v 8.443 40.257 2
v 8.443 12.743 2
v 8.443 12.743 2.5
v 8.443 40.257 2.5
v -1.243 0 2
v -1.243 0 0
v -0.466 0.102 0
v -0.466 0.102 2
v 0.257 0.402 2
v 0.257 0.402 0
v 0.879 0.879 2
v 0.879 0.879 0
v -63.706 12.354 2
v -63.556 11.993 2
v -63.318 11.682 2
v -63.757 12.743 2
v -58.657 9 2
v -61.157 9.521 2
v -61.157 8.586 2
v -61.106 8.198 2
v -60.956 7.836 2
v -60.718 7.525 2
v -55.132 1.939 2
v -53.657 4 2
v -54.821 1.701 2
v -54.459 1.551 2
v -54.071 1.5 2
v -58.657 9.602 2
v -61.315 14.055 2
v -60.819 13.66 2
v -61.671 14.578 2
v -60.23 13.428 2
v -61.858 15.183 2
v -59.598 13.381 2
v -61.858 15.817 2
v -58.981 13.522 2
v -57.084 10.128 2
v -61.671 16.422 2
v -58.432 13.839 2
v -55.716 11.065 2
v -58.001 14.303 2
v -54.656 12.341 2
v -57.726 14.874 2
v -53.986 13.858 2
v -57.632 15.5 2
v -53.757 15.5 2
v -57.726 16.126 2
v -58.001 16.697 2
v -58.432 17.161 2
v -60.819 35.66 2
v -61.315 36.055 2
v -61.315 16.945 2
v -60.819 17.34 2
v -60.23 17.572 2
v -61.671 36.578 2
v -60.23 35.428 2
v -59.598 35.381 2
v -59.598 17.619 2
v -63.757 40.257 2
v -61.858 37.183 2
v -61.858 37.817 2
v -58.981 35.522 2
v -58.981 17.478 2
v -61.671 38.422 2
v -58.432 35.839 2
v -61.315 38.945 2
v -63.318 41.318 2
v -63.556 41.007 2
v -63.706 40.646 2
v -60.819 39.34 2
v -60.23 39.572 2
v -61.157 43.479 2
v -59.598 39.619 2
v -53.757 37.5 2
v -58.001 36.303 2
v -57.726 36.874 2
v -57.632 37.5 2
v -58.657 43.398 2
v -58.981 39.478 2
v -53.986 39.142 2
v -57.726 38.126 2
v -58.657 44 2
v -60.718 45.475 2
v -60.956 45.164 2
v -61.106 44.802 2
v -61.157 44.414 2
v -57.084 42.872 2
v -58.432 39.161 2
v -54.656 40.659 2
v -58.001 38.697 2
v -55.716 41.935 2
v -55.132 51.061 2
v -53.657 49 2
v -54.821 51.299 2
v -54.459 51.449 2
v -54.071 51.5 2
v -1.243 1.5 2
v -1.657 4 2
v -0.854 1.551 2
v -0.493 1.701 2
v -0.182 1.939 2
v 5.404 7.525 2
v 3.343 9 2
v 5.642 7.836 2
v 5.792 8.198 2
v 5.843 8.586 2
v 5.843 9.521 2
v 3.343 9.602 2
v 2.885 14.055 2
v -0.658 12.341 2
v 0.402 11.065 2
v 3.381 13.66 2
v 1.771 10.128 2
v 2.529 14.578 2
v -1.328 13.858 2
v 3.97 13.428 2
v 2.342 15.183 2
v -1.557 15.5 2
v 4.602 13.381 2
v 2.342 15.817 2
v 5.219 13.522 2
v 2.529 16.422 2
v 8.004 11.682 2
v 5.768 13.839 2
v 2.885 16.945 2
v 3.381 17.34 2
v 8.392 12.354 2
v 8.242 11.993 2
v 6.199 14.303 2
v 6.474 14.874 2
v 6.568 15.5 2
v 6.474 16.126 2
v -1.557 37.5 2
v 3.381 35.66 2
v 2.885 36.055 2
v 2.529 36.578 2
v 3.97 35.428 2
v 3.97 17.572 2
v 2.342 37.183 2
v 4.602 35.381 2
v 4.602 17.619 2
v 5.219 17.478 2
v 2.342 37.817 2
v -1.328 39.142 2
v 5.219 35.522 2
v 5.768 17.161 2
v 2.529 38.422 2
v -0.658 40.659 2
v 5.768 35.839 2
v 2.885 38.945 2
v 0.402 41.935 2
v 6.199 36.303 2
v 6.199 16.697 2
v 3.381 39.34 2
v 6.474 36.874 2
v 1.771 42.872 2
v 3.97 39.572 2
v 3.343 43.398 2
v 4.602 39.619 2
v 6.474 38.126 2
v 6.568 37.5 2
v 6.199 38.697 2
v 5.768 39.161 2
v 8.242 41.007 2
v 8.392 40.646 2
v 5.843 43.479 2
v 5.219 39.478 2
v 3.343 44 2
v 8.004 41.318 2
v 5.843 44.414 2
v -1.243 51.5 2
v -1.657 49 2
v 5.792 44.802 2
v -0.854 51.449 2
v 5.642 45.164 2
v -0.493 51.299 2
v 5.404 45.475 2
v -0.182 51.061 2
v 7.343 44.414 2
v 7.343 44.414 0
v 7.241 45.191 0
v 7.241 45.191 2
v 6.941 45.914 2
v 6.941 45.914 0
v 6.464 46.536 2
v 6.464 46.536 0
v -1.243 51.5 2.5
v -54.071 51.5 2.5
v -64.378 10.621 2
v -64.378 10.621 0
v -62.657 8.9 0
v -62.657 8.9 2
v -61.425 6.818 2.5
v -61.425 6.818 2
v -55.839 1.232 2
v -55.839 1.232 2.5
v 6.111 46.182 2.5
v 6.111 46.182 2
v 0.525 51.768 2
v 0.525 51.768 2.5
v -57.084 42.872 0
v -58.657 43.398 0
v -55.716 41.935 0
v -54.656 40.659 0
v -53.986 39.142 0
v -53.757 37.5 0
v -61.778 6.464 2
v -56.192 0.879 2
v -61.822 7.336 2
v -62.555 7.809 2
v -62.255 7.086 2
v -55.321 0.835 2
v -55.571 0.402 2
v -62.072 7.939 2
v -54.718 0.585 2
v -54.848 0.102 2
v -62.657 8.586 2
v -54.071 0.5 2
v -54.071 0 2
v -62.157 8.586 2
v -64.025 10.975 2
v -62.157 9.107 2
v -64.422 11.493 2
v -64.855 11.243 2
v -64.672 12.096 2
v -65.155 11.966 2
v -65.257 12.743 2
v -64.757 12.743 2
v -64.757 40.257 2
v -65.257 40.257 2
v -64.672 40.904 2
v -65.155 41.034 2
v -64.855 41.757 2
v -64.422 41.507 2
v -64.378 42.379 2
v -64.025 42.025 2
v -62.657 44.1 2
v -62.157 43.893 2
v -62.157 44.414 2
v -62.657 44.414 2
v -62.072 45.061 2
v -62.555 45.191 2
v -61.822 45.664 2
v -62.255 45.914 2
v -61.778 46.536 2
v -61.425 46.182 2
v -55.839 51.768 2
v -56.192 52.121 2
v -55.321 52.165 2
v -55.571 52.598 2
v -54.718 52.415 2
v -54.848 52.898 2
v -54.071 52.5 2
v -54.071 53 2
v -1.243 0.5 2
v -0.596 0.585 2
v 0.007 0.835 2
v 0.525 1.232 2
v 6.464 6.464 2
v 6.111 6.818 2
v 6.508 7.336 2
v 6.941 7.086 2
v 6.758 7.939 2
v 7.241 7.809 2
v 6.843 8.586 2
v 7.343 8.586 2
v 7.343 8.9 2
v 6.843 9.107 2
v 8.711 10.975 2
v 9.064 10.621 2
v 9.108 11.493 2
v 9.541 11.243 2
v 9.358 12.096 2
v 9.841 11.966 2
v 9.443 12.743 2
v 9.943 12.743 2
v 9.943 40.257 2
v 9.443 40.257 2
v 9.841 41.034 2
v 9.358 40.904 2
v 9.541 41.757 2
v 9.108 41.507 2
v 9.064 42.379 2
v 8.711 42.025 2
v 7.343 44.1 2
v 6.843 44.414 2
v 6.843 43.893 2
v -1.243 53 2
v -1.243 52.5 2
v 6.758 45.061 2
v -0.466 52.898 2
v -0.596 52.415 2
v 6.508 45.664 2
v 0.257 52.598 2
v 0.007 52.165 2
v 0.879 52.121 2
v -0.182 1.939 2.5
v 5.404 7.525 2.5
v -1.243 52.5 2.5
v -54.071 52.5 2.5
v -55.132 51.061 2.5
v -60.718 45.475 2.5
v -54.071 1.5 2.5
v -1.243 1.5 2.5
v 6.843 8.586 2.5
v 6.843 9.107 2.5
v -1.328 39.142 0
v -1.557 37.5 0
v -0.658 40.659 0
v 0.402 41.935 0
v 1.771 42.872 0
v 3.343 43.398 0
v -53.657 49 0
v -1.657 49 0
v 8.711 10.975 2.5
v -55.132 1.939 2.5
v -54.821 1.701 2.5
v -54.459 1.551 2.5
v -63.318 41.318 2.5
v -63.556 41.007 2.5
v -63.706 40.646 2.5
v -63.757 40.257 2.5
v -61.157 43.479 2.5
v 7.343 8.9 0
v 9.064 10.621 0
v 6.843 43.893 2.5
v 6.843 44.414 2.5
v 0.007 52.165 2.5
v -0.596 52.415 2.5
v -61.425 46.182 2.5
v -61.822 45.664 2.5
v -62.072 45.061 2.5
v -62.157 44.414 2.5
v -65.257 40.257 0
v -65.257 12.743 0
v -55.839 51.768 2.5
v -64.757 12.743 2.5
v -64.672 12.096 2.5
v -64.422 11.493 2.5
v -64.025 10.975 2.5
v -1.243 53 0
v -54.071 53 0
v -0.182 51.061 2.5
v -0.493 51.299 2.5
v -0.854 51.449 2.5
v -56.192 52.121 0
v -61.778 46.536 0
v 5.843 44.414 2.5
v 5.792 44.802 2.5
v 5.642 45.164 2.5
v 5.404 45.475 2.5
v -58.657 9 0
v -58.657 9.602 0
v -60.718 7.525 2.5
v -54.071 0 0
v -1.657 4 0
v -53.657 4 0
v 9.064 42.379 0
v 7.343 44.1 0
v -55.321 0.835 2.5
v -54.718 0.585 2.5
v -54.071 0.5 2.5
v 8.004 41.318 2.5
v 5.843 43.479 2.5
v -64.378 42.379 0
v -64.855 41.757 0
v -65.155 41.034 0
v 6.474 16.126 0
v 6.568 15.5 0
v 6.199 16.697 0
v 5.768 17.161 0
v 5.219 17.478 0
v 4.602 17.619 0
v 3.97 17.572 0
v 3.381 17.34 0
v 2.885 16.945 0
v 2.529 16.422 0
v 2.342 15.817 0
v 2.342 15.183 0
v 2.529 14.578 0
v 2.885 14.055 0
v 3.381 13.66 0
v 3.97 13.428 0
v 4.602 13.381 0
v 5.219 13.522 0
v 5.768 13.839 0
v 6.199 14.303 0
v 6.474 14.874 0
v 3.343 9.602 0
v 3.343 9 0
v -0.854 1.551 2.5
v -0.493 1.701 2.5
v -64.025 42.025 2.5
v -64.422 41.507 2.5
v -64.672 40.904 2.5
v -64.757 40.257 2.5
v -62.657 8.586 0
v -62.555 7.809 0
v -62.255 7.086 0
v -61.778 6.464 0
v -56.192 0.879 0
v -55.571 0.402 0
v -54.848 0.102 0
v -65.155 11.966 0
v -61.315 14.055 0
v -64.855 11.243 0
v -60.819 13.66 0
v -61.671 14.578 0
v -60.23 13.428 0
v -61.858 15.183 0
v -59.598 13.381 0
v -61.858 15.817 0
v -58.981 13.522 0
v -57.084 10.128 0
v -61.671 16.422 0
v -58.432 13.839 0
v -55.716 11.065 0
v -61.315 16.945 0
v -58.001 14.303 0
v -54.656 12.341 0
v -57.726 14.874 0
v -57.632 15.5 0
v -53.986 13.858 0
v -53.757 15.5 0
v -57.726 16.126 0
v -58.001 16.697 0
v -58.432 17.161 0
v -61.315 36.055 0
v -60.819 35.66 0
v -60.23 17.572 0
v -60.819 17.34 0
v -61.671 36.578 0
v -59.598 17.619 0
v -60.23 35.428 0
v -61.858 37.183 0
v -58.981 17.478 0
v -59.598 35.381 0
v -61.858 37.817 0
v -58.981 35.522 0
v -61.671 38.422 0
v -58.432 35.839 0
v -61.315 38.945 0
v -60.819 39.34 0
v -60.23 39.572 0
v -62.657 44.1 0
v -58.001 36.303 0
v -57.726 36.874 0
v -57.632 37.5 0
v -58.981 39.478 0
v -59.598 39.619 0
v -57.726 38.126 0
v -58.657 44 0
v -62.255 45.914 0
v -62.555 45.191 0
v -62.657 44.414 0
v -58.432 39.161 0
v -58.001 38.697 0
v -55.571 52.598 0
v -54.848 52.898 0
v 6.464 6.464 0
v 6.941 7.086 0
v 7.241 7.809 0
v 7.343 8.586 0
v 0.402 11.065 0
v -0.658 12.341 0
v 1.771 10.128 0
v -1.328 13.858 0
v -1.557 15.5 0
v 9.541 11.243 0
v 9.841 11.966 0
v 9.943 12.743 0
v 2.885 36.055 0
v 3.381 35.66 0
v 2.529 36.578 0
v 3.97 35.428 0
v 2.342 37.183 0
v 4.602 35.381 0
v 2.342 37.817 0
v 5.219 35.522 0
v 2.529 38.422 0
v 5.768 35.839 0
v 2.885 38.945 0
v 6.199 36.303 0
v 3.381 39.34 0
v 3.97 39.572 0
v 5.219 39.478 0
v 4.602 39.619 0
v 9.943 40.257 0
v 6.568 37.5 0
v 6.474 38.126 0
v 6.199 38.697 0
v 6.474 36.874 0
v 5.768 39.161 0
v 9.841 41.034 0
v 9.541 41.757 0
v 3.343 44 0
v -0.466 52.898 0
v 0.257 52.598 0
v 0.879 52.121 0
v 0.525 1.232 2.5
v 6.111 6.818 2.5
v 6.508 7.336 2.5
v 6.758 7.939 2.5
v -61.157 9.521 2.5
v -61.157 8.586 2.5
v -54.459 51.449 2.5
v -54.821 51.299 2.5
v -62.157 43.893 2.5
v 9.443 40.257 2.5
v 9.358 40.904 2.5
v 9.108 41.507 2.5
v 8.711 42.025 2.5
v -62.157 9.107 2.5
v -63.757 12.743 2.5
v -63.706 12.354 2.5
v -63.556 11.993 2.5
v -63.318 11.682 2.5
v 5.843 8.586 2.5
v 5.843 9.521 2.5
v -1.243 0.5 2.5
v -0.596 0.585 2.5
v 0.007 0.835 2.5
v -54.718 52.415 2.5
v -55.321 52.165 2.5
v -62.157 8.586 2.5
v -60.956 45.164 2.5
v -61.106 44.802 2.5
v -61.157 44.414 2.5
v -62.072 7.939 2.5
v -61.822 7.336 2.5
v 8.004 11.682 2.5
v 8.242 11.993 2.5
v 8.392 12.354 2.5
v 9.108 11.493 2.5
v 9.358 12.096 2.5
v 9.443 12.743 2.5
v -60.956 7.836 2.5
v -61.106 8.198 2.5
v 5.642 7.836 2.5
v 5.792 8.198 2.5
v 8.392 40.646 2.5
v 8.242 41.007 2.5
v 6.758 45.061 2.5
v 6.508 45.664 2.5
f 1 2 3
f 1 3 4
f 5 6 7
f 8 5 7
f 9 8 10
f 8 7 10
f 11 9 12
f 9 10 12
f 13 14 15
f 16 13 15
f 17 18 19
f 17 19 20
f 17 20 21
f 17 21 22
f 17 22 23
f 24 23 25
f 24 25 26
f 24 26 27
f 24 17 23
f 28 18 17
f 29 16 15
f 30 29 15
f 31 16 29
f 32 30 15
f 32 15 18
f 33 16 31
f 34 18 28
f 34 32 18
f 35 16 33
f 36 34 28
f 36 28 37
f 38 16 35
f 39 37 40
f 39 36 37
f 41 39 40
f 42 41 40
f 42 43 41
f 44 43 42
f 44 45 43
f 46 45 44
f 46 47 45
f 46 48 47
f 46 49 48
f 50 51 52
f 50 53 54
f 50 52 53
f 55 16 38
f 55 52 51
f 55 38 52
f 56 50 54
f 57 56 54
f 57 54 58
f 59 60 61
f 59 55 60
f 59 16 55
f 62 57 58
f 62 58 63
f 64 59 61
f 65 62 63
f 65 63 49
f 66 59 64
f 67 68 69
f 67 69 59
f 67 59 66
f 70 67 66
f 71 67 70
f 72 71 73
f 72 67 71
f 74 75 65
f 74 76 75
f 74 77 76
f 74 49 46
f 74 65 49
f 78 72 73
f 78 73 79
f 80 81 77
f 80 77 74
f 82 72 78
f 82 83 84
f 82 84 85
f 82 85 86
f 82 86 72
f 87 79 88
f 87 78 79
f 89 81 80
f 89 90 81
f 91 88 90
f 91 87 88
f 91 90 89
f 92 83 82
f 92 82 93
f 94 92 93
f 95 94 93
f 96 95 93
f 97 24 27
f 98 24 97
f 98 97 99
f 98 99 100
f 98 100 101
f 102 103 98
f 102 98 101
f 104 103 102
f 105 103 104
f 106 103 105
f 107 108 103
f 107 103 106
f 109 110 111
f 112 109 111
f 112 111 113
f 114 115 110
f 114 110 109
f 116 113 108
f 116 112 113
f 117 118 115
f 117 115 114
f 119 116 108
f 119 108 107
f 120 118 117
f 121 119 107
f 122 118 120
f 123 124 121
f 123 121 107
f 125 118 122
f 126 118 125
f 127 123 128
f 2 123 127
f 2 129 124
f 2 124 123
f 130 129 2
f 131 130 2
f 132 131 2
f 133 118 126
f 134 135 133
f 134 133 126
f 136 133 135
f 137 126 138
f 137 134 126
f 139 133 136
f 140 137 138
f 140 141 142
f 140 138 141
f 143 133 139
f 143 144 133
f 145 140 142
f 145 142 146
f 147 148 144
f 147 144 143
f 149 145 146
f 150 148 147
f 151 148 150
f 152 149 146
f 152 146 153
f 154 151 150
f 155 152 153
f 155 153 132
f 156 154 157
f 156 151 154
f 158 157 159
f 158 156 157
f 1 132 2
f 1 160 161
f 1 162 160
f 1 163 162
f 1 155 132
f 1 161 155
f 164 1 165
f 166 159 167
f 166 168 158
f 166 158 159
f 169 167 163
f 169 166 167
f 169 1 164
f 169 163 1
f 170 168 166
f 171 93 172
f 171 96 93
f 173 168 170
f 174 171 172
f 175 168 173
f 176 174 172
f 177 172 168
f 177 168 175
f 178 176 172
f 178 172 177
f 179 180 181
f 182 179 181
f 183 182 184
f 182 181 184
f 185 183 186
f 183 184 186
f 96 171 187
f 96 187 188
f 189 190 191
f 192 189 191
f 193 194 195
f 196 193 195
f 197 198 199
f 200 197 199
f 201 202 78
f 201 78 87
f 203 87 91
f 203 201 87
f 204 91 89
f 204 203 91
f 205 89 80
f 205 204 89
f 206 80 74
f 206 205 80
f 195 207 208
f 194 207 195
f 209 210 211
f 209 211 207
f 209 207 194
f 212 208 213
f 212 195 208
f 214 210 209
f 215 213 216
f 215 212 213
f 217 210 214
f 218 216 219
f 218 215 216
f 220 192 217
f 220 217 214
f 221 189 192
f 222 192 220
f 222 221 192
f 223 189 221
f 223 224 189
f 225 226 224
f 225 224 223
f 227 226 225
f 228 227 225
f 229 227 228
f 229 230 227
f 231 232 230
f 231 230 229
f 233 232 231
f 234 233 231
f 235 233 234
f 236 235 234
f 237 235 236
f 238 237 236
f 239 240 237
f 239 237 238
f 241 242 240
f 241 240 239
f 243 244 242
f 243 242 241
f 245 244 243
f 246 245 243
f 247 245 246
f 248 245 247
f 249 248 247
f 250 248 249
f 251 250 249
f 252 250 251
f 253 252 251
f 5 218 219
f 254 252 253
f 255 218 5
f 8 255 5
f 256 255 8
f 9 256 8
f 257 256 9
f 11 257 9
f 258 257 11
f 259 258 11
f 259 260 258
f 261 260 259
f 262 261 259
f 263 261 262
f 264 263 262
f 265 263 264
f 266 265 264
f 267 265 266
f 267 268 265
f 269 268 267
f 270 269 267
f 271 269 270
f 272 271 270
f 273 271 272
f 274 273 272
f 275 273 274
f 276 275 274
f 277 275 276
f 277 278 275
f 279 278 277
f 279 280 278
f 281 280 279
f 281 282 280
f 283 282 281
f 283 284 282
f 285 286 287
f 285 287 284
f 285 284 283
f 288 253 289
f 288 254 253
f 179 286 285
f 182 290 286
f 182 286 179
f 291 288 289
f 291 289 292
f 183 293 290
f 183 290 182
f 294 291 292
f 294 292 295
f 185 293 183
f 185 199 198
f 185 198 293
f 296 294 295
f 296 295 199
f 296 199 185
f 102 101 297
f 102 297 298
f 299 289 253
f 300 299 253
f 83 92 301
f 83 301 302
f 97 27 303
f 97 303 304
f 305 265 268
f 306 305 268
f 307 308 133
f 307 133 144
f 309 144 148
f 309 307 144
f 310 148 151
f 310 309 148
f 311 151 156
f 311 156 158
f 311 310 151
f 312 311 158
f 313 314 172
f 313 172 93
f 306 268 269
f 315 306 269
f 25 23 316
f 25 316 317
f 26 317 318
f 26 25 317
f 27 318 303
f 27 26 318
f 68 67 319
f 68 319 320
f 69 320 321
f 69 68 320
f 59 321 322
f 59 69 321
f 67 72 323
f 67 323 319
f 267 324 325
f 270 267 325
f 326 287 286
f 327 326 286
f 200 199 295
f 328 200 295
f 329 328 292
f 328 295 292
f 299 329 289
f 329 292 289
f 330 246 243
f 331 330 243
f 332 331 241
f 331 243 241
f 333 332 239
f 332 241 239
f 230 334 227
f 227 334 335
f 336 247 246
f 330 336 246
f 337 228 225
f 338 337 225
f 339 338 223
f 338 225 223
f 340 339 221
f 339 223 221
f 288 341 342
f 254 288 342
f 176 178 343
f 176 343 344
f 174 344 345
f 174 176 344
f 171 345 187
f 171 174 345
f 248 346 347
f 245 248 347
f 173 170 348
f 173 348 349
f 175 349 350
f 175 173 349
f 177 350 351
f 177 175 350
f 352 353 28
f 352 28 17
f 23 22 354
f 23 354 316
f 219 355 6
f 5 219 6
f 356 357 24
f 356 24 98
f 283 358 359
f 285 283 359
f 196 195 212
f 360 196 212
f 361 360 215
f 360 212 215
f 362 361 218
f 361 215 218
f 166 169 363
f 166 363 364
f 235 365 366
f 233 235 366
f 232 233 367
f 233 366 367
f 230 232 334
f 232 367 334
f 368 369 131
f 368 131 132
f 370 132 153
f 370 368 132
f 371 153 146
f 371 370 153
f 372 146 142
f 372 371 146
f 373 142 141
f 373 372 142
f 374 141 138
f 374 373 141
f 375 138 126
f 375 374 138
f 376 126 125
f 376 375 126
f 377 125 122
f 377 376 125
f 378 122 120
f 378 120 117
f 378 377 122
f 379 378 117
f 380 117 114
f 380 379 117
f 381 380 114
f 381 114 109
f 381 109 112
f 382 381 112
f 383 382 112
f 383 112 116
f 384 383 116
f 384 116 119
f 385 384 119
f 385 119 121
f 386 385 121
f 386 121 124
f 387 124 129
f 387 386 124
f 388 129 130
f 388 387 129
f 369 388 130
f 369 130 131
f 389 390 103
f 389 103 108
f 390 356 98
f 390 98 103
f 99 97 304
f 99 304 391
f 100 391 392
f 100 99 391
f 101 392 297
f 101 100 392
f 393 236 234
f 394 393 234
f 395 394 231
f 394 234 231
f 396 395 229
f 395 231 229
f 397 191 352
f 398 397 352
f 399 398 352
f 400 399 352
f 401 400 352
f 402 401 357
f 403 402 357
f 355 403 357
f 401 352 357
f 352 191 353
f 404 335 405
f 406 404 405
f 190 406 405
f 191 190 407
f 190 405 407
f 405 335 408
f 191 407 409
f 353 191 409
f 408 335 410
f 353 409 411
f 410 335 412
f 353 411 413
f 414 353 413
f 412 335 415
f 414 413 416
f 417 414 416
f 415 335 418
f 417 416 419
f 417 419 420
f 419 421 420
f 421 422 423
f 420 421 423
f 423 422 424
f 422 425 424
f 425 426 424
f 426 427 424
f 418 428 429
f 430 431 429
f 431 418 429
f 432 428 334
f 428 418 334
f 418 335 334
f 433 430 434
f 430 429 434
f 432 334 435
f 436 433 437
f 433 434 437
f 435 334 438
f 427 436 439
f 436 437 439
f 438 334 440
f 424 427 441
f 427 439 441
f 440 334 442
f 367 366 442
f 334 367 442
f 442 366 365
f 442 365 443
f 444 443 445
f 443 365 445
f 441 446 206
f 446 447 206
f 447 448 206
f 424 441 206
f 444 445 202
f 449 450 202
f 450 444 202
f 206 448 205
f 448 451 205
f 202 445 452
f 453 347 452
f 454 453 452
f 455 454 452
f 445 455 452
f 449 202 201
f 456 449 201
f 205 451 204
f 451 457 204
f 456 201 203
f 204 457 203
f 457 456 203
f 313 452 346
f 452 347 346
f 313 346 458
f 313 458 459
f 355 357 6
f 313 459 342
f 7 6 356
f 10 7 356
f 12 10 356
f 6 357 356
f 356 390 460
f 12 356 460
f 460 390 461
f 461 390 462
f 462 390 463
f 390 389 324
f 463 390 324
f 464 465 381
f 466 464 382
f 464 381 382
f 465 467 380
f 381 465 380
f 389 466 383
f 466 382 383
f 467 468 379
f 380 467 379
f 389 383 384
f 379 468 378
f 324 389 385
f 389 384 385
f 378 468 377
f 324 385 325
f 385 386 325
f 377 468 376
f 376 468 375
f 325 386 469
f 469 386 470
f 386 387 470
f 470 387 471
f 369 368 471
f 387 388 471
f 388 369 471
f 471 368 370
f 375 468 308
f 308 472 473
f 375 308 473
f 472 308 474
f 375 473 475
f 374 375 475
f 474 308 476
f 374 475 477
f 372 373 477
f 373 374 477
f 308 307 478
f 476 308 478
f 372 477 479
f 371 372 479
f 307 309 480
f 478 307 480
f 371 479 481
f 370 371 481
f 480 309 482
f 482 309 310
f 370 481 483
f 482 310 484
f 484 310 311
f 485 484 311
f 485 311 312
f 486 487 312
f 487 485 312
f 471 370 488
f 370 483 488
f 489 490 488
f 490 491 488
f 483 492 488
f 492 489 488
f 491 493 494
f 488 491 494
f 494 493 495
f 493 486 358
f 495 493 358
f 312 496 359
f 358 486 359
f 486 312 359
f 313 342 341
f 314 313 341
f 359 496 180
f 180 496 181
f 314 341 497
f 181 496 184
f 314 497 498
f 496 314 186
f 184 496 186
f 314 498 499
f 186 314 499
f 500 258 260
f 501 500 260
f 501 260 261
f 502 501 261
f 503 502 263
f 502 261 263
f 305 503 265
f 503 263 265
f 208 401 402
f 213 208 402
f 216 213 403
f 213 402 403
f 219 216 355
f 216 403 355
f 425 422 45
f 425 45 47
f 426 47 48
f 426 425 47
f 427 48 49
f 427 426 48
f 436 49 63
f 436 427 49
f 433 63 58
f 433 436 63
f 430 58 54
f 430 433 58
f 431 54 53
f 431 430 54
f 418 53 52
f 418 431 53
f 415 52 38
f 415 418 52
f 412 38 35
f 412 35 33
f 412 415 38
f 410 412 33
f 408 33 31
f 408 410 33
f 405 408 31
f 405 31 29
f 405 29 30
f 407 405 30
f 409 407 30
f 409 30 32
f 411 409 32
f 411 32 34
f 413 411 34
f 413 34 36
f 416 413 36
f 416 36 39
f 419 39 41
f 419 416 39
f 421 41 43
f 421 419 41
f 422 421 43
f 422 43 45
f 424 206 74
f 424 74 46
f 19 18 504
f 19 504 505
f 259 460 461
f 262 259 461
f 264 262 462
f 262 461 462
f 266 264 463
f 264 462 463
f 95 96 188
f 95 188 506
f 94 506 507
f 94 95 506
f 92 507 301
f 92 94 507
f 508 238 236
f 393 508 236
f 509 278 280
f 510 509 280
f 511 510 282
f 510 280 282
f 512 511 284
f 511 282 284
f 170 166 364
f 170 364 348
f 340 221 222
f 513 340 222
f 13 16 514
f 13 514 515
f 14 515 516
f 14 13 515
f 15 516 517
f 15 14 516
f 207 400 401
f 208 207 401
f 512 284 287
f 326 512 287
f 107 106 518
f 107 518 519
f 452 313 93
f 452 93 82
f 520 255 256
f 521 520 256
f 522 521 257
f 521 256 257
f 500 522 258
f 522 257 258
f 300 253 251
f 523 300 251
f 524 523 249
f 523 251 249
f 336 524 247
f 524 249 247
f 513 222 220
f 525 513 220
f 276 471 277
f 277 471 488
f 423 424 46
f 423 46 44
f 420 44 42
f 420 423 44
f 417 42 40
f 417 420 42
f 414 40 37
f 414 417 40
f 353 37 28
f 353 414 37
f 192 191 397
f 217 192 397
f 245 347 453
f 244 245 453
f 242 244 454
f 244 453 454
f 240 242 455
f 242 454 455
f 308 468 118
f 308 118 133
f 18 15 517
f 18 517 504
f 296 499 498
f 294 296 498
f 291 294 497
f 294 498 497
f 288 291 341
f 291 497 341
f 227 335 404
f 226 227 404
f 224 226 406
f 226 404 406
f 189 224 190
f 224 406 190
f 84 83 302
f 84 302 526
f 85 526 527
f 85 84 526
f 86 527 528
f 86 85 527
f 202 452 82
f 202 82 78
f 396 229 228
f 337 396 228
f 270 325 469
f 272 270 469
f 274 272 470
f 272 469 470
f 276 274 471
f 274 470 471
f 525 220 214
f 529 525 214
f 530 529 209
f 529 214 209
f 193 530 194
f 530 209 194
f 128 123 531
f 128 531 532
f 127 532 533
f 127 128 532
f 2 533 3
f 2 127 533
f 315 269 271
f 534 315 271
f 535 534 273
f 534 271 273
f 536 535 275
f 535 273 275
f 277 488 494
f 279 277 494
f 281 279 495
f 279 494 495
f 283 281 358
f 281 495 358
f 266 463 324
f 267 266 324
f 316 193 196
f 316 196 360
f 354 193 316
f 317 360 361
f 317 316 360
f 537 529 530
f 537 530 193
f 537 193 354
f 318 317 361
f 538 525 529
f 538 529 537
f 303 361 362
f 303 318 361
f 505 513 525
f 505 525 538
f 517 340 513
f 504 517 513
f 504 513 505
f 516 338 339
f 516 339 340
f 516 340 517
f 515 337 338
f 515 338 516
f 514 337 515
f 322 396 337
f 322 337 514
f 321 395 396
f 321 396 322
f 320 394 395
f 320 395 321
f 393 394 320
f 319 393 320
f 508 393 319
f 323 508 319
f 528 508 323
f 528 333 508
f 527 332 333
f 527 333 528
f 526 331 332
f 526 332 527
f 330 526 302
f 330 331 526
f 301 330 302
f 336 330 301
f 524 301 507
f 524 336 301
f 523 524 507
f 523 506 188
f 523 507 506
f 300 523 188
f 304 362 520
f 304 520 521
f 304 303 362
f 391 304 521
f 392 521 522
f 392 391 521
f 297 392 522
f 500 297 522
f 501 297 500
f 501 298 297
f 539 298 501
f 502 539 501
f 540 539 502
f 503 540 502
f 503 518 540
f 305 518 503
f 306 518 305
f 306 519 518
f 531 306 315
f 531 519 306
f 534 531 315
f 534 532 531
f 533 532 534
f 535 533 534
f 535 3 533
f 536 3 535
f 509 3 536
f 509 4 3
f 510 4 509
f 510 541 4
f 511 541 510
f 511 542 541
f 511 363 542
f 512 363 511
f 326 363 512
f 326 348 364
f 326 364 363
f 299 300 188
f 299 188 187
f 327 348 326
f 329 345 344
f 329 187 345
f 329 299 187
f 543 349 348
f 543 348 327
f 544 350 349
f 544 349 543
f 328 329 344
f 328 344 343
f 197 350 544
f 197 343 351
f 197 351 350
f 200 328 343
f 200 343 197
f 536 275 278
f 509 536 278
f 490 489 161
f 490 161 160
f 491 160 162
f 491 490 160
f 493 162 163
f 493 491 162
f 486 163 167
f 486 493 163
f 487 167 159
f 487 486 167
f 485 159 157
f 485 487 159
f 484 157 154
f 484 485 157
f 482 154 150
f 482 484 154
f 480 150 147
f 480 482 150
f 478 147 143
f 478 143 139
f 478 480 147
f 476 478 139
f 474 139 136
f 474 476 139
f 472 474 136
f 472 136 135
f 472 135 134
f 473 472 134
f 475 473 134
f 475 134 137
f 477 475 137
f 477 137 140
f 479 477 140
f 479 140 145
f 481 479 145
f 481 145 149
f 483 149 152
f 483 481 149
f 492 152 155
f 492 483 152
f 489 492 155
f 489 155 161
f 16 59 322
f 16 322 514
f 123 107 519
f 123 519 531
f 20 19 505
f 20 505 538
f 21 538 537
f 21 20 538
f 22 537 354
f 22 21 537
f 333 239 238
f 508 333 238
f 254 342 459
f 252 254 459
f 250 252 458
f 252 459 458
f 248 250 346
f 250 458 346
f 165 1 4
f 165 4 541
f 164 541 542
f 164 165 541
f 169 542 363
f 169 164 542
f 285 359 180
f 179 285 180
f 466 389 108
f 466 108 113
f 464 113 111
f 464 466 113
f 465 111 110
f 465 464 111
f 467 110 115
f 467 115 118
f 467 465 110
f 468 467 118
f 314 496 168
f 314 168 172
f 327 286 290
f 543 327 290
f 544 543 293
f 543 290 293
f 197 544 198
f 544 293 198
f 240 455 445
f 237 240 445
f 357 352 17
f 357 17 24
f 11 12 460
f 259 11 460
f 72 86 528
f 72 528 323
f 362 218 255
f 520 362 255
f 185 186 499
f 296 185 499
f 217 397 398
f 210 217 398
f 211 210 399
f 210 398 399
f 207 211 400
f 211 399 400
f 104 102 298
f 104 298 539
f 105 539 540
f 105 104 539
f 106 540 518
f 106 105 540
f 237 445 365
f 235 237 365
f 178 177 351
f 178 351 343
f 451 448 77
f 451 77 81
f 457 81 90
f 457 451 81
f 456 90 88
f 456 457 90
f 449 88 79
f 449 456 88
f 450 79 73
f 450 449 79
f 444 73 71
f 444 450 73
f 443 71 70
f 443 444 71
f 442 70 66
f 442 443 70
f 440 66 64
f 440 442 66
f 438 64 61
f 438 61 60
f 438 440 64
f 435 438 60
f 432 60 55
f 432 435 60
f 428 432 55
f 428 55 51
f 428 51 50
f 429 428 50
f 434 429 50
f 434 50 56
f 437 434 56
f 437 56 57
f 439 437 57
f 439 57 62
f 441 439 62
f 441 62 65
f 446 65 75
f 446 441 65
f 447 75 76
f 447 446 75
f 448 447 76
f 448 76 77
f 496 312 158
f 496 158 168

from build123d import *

# Parameters (mm, degrees)
SKETCH1_R           = 2.125
BOSS_EXTRUDE1_DEPTH = 2
BOSS_EXTRUDE2_DEPTH = 0.5


with BuildPart() as part:
    # Sketch1 → Boss-Extrude1 (new body)
    with BuildSketch(Plane.XY):
        with BuildLine():
            Line((-64.378174593, 10.621320344), (-62.656854249, 8.9))
            Line((-62.656854249, 8.9), (-62.656854249, 8.585786438))
            ThreePointArc((-62.656854249, 8.585786438), (-62.428492847, 7.437736141), (-61.778174593, 6.464466094))
            Line((-61.778174593, 6.464466094), (-56.192388155, 0.878679656))
            ThreePointArc((-56.192388155, 0.878679656), (-55.219118109, 0.228361402), (-54.071067812, 0))
            Line((-54.071067812, 0), (-1.242640687, 0))
            ThreePointArc((-1.242640687, 0), (-0.09459039, 0.228361402), (0.878679656, 0.878679656))
            Line((0.878679656, 0.878679656), (6.464466094, 6.464466094))
            ThreePointArc((6.464466094, 6.464466094), (7.114784348, 7.437736141), (7.343145751, 8.585786438))
            Line((7.343145751, 8.585786438), (7.343145751, 8.9))
            Line((7.343145751, 8.9), (9.064466094, 10.621320344))
            ThreePointArc((9.064466094, 10.621320344), (9.714784348, 11.59459039), (9.943145751, 12.742640687))
            Line((9.943145751, 12.742640687), (9.943145751, 40.257359313))
            ThreePointArc((9.943145751, 40.257359313), (9.714784348, 41.40540961), (9.064466094, 42.378679656))
            Line((9.064466094, 42.378679656), (7.343145751, 44.1))
            Line((7.343145751, 44.1), (7.343145751, 44.414213562))
            ThreePointArc((7.343145751, 44.414213562), (7.114784348, 45.562263859), (6.464466094, 46.535533906))
            Line((6.464466094, 46.535533906), (0.878679656, 52.121320344))
            ThreePointArc((0.878679656, 52.121320344), (-0.09459039, 52.771638598), (-1.242640687, 53))
            Line((-1.242640687, 53), (-54.071067812, 53))
            ThreePointArc((-54.071067812, 53), (-55.219118109, 52.771638598), (-56.192388155, 52.121320344))
            Line((-56.192388155, 52.121320344), (-61.778174593, 46.535533906))
            ThreePointArc((-61.778174593, 46.535533906), (-62.428492847, 45.562263859), (-62.656854249, 44.414213562))
            Line((-62.656854249, 44.414213562), (-62.656854249, 44.1))
            Line((-62.656854249, 44.1), (-64.378174593, 42.378679656))
            ThreePointArc((-64.378174593, 42.378679656), (-65.028492847, 41.40540961), (-65.256854249, 40.257359313))
            Line((-65.256854249, 40.257359313), (-65.256854249, 12.742640687))
            ThreePointArc((-65.256854249, 12.742640687), (-65.028492847, 11.59459039), (-64.378174593, 10.621320344))
        make_face()
        with Locations((4.443145751, 37.5)):
            Circle(SKETCH1_R, mode=Mode.SUBTRACT)
        with Locations((-59.756854249, 37.5)):
            Circle(SKETCH1_R, mode=Mode.SUBTRACT)
        with Locations((-59.756854249, 15.5)):
            Circle(SKETCH1_R, mode=Mode.SUBTRACT)
        with Locations((4.443145751, 15.5)):
            Circle(SKETCH1_R, mode=Mode.SUBTRACT)
        with BuildLine():
            Line((-1.656854249, 49), (-53.656854249, 49))
            Line((-53.656854249, 49), (-58.656854249, 44))
            Line((-58.656854249, 44), (-58.656854249, 43.398304841))
            ThreePointArc((-58.656854249, 43.398304841), (-55.141661946, 41.334057903), (-53.756854249, 37.5))
            Line((-53.756854249, 37.5), (-53.756854249, 15.5))
            ThreePointArc((-53.756854249, 15.5), (-55.141661946, 11.665942097), (-58.656854249, 9.601695159))
            Line((-58.656854249, 9.601695159), (-58.656854249, 9))
            Line((-58.656854249, 9), (-53.656854249, 4))
            Line((-53.656854249, 4), (-1.656854249, 4))
            Line((-1.656854249, 4), (3.343145751, 9))
            Line((3.343145751, 9), (3.343145751, 9.601695159))
            ThreePointArc((3.343145751, 9.601695159), (-0.172046553, 11.665942097), (-1.556854249, 15.5))
            Line((-1.556854249, 15.5), (-1.556854249, 37.5))
            ThreePointArc((-1.556854249, 37.5), (-0.172046553, 41.334057903), (3.343145751, 43.398304841))
            Line((3.343145751, 43.398304841), (3.343145751, 44))
            Line((3.343145751, 44), (-1.656854249, 49))
        make_face(mode=Mode.SUBTRACT)
    extrude(amount=BOSS_EXTRUDE1_DEPTH)

    # Sketch2 → Boss-Extrude2 (add)
    with BuildSketch(Plane.XY.offset(2)):
        with BuildLine():
            Line((-62.156854249, 9.107106781), (-62.156854249, 8.585786438))
            ThreePointArc((-62.156854249, 8.585786438), (-61.966553081, 7.629077857), (-61.424621202, 6.818019485))
            Line((-61.424621202, 6.818019485), (-55.838834765, 1.232233047))
            ThreePointArc((-55.838834765, 1.232233047), (-55.027776393, 0.690301169), (-54.071067812, 0.5))
            Line((-54.071067812, 0.5), (-1.242640687, 0.5))
            ThreePointArc((-1.242640687, 0.5), (-0.285932106, 0.690301169), (0.525126266, 1.232233047))
            Line((0.525126266, 1.232233047), (6.110912703, 6.818019485))
            ThreePointArc((6.110912703, 6.818019485), (6.652844582, 7.629077857), (6.843145751, 8.585786438))
            Line((6.843145751, 8.585786438), (6.843145751, 9.107106781))
            Line((6.843145751, 9.107106781), (8.710912703, 10.974873734))
            ThreePointArc((8.710912703, 10.974873734), (9.252844582, 11.785932106), (9.443145751, 12.742640687))
            Line((9.443145751, 12.742640687), (9.443145751, 40.257359313))
            ThreePointArc((9.443145751, 40.257359313), (9.252844582, 41.214067894), (8.710912703, 42.025126266))
            Line((8.710912703, 42.025126266), (6.843145751, 43.892893219))
            Line((6.843145751, 43.892893219), (6.843145751, 44.414213562))
            ThreePointArc((6.843145751, 44.414213562), (6.652844582, 45.370922143), (6.110912703, 46.181980515))
            Line((6.110912703, 46.181980515), (0.525126266, 51.767766953))
            ThreePointArc((0.525126266, 51.767766953), (-0.285932106, 52.309698831), (-1.242640687, 52.5))
            Line((-1.242640687, 52.5), (-54.071067812, 52.5))
            ThreePointArc((-54.071067812, 52.5), (-55.027776393, 52.309698831), (-55.838834765, 51.767766953))
            Line((-55.838834765, 51.767766953), (-61.424621202, 46.181980515))
            ThreePointArc((-61.424621202, 46.181980515), (-61.966553081, 45.370922143), (-62.156854249, 44.414213562))
            Line((-62.156854249, 44.414213562), (-62.156854249, 43.892893219))
            Line((-62.156854249, 43.892893219), (-64.024621202, 42.025126266))
            ThreePointArc((-64.024621202, 42.025126266), (-64.566553081, 41.214067894), (-64.756854249, 40.257359313))
            Line((-64.756854249, 40.257359313), (-64.756854249, 12.742640687))
            ThreePointArc((-64.756854249, 12.742640687), (-64.566553081, 11.785932106), (-64.024621202, 10.974873734))
            Line((-64.024621202, 10.974873734), (-62.156854249, 9.107106781))
        make_face()
        with BuildLine():
            Line((-61.156854249, 9.521320344), (-61.156854249, 8.585786438))
            ThreePointArc((-61.156854249, 8.585786438), (-61.042673548, 8.011761289), (-60.717514421, 7.525126266))
            Line((-60.717514421, 7.525126266), (-55.131727984, 1.939339828))
            ThreePointArc((-55.131727984, 1.939339828), (-54.64509296, 1.614180701), (-54.071067812, 1.5))
            Line((-54.071067812, 1.5), (-1.242640687, 1.5))
            ThreePointArc((-1.242640687, 1.5), (-0.668615539, 1.614180701), (-0.181980515, 1.939339828))
            Line((-0.181980515, 1.939339828), (5.403805922, 7.525126266))
            ThreePointArc((5.403805922, 7.525126266), (5.728965049, 8.011761289), (5.843145751, 8.585786438))
            Line((5.843145751, 8.585786438), (5.843145751, 9.521320344))
            Line((5.843145751, 9.521320344), (8.003805922, 11.681980515))
            ThreePointArc((8.003805922, 11.681980515), (8.328965049, 12.168615539), (8.443145751, 12.742640687))
            Line((8.443145751, 12.742640687), (8.443145751, 40.257359313))
            ThreePointArc((8.443145751, 40.257359313), (8.328965049, 40.831384461), (8.003805922, 41.318019485))
            Line((8.003805922, 41.318019485), (5.843145751, 43.478679656))
            Line((5.843145751, 43.478679656), (5.843145751, 44.414213562))
            ThreePointArc((5.843145751, 44.414213562), (5.728965049, 44.988238711), (5.403805922, 45.474873734))
            Line((5.403805922, 45.474873734), (-0.181980515, 51.060660172))
            ThreePointArc((-0.181980515, 51.060660172), (-0.668615539, 51.385819299), (-1.242640687, 51.5))
            Line((-1.242640687, 51.5), (-54.071067812, 51.5))
            ThreePointArc((-54.071067812, 51.5), (-54.64509296, 51.385819299), (-55.131727984, 51.060660172))
            Line((-55.131727984, 51.060660172), (-60.717514421, 45.474873734))
            ThreePointArc((-60.717514421, 45.474873734), (-61.042673548, 44.988238711), (-61.156854249, 44.414213562))
            Line((-61.156854249, 44.414213562), (-61.156854249, 43.478679656))
            Line((-61.156854249, 43.478679656), (-63.317514421, 41.318019485))
            ThreePointArc((-63.317514421, 41.318019485), (-63.642673548, 40.831384461), (-63.756854249, 40.257359313))
            Line((-63.756854249, 40.257359313), (-63.756854249, 12.742640687))
            ThreePointArc((-63.756854249, 12.742640687), (-63.642673548, 12.168615539), (-63.317514421, 11.681980515))
            Line((-63.317514421, 11.681980515), (-61.156854249, 9.521320344))
        make_face(mode=Mode.SUBTRACT)
    extrude(amount=BOSS_EXTRUDE2_DEPTH)


solid = part.part
